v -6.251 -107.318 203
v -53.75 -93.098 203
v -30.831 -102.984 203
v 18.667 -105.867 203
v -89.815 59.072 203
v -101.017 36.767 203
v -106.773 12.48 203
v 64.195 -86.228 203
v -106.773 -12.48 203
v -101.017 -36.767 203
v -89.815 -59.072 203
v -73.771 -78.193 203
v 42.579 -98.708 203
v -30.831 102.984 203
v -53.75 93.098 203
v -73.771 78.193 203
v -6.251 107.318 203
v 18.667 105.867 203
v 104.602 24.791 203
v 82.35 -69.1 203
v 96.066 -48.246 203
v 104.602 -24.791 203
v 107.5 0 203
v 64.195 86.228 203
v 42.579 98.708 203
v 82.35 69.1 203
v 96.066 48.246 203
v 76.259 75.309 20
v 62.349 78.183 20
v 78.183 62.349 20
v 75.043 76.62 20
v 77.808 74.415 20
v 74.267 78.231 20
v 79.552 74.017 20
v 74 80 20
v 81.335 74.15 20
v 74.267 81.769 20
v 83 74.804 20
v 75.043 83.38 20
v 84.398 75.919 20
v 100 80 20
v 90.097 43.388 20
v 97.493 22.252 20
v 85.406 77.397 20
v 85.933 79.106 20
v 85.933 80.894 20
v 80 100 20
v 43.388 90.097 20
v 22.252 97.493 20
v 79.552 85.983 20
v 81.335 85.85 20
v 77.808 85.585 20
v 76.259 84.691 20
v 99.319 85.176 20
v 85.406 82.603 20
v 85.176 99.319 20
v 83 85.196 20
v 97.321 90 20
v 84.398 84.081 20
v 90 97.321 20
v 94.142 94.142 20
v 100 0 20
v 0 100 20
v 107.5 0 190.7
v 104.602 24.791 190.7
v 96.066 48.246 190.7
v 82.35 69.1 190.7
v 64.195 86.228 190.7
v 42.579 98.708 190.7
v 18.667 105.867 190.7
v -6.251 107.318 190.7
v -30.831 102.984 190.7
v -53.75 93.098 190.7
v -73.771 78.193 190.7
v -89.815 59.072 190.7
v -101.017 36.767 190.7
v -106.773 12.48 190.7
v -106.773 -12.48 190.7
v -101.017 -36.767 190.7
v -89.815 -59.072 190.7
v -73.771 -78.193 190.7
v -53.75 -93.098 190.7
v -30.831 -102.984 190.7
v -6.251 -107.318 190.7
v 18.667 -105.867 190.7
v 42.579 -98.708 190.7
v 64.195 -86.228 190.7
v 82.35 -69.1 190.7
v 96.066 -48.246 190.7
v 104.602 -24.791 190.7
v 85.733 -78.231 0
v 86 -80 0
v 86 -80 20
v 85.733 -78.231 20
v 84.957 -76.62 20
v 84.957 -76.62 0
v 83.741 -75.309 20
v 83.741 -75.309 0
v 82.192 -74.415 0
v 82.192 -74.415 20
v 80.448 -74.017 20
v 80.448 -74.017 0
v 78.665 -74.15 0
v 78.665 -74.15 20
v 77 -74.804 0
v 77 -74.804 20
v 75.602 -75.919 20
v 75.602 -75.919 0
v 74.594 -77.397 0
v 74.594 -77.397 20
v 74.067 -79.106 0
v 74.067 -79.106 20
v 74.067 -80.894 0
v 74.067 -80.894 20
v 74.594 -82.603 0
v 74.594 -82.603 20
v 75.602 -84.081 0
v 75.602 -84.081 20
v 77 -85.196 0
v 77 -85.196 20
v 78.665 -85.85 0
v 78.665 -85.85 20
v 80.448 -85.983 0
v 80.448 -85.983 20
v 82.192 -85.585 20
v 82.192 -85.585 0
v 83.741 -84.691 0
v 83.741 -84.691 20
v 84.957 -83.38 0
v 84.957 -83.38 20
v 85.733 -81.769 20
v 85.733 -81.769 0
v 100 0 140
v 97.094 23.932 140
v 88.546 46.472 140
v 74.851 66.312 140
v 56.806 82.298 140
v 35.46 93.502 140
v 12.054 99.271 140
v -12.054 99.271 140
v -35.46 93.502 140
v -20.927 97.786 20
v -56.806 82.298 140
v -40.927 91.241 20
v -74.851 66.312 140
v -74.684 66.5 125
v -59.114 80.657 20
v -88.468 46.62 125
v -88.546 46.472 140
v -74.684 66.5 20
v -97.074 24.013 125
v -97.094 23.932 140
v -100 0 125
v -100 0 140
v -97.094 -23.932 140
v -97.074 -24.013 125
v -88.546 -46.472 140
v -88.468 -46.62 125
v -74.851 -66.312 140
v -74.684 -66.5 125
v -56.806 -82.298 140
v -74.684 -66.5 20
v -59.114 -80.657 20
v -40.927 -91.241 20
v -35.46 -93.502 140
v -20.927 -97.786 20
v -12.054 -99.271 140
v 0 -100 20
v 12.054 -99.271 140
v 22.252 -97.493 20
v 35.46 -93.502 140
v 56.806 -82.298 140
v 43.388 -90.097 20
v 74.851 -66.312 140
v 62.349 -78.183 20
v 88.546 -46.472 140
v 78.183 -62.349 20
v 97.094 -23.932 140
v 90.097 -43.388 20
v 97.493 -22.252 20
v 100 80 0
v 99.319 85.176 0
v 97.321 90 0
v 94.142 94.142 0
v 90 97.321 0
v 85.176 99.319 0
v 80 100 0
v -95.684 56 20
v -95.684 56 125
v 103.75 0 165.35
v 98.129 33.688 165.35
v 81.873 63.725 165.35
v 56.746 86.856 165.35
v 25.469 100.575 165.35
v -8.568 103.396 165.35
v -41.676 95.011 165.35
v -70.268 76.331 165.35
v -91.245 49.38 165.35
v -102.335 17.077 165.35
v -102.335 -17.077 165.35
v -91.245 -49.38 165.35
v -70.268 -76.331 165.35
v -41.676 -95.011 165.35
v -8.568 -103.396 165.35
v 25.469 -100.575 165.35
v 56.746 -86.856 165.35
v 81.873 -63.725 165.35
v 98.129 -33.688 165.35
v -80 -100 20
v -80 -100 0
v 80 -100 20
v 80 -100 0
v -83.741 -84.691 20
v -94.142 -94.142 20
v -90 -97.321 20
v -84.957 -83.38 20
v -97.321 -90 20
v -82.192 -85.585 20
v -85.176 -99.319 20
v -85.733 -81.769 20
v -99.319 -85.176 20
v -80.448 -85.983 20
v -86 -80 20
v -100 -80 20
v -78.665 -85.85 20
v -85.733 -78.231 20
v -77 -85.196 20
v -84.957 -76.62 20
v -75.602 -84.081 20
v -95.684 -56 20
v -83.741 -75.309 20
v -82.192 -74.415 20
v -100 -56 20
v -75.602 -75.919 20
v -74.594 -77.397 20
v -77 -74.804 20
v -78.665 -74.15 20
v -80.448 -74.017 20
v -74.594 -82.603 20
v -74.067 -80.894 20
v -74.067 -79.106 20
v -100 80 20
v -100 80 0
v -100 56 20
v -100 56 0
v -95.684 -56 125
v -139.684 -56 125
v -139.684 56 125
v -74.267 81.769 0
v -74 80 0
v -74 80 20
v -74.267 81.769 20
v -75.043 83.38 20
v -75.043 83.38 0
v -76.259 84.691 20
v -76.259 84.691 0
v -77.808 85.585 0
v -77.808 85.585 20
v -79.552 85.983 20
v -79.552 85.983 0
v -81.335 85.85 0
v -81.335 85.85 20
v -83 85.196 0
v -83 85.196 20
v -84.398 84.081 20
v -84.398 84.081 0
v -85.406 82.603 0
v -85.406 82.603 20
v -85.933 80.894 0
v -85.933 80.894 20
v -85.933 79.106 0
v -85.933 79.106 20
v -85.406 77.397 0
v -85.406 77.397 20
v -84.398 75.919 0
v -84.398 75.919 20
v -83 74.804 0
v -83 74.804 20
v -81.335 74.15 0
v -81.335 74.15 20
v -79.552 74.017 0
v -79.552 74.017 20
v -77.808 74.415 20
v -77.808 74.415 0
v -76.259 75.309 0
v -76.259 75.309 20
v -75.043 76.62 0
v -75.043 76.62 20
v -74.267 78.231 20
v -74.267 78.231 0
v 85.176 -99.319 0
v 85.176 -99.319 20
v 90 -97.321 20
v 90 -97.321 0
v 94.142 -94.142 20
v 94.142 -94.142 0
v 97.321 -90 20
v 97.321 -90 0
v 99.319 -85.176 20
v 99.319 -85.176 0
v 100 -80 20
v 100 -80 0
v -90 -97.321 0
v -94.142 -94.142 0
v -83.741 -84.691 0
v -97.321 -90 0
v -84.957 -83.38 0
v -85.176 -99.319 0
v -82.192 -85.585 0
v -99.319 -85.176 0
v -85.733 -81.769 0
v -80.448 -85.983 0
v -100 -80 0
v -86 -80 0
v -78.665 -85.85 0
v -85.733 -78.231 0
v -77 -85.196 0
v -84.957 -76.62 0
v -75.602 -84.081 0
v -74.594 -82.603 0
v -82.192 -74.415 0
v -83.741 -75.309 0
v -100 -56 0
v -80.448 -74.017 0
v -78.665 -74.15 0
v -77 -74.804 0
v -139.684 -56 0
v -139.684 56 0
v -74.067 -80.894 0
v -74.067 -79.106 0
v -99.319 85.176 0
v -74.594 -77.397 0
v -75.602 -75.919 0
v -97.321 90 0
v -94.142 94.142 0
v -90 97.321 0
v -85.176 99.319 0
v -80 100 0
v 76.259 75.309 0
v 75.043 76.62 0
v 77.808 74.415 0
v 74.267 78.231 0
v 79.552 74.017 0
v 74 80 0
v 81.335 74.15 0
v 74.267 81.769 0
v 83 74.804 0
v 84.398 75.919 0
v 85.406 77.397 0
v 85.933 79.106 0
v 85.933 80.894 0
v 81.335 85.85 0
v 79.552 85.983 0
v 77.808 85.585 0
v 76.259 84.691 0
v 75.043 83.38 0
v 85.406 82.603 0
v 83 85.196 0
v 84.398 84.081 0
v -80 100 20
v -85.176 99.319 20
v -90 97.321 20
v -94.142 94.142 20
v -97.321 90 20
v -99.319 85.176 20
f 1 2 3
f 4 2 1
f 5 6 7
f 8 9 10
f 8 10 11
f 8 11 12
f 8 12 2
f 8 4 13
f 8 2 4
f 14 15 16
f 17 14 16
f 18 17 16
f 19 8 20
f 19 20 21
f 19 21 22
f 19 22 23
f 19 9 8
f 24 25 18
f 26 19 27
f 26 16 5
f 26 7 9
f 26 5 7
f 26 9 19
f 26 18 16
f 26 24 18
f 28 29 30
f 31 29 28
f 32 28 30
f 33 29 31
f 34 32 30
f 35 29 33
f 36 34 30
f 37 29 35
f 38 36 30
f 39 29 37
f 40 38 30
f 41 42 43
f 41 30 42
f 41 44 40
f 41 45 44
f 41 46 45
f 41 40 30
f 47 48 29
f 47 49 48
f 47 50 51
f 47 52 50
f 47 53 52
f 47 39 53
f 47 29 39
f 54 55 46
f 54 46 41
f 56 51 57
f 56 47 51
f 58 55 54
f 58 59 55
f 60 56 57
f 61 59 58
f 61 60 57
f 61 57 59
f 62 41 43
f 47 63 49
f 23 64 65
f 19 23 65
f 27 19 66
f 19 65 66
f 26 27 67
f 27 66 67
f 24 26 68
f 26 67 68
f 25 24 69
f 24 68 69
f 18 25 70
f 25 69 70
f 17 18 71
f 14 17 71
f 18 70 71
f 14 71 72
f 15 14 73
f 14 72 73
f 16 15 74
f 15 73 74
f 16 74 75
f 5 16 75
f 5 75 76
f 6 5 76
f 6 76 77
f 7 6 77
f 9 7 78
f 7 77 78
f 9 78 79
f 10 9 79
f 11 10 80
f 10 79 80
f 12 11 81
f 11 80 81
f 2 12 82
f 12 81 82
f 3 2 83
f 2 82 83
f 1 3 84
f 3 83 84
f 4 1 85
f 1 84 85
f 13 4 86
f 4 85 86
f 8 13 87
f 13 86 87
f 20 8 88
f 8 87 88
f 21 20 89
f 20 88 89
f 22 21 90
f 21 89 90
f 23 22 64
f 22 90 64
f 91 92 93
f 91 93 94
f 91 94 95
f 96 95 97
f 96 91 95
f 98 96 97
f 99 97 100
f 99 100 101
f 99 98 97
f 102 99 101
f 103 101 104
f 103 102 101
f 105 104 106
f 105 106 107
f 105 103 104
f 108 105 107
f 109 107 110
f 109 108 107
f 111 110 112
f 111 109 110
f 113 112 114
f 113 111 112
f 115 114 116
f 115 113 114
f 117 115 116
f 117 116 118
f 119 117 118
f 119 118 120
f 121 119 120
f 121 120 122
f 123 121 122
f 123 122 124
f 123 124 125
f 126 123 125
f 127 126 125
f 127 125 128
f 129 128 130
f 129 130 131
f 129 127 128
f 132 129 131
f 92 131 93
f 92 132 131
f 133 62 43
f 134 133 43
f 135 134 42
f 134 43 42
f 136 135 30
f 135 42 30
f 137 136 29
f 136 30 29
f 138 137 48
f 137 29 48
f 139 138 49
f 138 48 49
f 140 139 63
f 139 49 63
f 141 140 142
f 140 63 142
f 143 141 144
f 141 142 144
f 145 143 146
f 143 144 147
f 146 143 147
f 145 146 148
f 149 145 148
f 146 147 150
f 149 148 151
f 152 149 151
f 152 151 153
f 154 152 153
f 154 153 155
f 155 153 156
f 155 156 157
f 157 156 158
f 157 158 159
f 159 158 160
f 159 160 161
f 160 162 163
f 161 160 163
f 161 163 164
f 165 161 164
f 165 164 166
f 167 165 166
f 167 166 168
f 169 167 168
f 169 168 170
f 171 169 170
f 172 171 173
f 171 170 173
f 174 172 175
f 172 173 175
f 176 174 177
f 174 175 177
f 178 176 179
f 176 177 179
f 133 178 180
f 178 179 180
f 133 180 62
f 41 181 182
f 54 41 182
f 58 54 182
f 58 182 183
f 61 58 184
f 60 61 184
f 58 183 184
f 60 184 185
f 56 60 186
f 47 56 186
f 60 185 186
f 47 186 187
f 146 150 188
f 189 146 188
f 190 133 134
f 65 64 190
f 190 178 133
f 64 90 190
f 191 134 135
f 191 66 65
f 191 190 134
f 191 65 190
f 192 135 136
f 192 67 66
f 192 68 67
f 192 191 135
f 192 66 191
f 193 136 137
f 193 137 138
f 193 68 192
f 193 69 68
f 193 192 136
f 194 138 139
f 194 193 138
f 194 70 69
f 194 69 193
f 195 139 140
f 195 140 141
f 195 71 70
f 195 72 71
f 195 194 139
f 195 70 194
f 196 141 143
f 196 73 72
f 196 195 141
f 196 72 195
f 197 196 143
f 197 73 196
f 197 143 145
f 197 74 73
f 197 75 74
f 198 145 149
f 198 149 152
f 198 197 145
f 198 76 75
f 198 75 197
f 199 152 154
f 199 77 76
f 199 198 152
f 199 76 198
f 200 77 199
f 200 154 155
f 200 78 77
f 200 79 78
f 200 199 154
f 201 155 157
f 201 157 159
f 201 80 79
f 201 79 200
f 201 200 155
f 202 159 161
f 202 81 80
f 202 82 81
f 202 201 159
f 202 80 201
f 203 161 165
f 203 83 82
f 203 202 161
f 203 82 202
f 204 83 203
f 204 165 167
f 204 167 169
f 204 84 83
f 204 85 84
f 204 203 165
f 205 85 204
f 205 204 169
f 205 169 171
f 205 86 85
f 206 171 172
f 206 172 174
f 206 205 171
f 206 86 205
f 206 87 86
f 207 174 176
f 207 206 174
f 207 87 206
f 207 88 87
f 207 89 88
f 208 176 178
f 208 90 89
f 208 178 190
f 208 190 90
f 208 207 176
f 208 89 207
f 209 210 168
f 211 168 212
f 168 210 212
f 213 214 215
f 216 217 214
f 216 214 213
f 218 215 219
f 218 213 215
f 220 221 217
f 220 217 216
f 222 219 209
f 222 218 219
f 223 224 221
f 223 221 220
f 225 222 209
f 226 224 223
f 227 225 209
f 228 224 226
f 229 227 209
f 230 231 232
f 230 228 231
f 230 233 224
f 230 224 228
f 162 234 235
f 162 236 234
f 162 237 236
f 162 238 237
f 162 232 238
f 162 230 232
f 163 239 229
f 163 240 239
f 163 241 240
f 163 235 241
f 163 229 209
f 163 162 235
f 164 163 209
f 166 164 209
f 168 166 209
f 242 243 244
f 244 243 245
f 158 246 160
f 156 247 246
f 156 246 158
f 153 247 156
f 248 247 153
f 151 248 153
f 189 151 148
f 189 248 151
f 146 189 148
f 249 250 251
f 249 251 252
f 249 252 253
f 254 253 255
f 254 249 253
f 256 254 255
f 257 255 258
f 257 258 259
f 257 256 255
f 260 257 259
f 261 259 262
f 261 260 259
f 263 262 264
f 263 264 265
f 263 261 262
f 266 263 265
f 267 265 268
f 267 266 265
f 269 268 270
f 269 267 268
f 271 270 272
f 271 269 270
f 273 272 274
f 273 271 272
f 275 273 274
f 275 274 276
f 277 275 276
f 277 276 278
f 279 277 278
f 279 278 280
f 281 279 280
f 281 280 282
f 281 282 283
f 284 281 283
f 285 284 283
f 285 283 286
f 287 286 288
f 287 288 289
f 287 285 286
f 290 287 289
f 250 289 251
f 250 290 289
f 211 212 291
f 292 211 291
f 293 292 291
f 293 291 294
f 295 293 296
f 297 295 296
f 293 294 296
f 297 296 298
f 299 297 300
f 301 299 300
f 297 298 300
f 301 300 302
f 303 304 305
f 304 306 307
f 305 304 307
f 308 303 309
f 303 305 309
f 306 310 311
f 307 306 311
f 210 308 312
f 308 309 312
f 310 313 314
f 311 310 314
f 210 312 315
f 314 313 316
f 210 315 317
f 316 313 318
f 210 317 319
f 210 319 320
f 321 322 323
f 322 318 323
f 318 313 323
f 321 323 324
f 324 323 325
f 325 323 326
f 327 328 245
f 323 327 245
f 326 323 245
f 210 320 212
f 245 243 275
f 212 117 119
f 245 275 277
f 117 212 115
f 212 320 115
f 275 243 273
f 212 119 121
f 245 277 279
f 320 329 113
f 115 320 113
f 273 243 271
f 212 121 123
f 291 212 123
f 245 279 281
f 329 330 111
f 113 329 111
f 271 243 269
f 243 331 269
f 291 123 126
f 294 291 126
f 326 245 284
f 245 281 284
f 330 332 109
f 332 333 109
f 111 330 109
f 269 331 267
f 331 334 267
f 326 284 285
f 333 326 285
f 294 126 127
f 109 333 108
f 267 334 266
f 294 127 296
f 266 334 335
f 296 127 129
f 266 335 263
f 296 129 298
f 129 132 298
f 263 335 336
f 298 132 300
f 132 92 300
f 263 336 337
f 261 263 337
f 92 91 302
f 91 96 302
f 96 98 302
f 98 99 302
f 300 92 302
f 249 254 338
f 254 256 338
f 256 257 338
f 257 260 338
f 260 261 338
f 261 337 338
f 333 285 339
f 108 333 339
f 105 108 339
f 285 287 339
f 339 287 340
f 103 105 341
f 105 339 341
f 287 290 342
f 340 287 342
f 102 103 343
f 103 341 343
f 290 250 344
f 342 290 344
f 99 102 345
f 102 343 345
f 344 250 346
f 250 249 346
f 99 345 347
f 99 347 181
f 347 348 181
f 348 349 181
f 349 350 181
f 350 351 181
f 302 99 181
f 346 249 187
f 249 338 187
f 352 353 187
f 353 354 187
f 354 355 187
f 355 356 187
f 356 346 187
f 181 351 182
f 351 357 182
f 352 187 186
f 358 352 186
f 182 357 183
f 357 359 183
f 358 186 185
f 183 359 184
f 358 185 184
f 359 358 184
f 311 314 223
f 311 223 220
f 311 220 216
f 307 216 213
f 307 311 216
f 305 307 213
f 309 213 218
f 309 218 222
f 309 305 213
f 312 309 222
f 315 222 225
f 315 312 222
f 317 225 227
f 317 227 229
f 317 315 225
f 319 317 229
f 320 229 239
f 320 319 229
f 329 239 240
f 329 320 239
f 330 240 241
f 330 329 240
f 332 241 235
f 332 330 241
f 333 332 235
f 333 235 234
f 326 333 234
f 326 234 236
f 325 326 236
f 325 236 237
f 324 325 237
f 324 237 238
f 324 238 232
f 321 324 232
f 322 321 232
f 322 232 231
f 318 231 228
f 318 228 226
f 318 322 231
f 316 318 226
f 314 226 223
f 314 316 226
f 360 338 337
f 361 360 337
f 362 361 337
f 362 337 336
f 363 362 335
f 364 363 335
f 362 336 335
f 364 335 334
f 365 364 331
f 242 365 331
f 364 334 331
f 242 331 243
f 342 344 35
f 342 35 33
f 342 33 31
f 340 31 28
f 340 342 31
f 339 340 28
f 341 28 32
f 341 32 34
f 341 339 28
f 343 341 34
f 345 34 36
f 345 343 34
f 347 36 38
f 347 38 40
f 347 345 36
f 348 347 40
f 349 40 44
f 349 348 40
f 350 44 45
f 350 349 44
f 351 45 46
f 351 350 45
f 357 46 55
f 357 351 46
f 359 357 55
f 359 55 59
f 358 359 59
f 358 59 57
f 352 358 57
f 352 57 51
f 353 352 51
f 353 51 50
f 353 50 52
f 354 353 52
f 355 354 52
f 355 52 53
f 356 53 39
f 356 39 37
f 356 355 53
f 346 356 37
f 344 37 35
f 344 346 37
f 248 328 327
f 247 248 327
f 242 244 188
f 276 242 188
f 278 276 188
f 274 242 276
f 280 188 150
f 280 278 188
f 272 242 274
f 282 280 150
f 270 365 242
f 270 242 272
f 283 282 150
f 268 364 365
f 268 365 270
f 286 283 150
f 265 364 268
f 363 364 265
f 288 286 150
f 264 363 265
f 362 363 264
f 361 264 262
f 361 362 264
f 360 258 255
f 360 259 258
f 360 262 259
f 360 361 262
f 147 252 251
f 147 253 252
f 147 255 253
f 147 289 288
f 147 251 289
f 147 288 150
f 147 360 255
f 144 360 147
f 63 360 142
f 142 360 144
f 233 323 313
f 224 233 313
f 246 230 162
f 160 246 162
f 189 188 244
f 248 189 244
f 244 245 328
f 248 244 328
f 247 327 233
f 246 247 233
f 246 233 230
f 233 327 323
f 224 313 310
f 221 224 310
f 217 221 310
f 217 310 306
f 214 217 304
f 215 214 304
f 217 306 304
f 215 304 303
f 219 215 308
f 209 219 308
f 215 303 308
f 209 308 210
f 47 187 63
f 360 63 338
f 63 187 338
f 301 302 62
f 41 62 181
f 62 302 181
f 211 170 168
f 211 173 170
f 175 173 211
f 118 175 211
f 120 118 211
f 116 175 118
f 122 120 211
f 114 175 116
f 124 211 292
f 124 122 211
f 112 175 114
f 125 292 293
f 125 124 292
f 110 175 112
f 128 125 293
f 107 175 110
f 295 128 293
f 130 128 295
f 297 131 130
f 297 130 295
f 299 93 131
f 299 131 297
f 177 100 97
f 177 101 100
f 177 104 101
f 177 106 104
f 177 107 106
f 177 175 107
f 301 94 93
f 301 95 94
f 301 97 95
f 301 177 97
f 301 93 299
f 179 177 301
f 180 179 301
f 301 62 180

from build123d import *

# Parameters (mm, degrees)
SCHIZZO1_R                  = 6
PIASTRABASE_DEPTH           = 20
SCHIZZO2_R                  = 100
CORPOCILINDRICO_DEPTH       = 120
SCHIZZO3_R                  = 107.5
SCHIZZO4_R                  = 107.5
CORPOCILINDRICOFINALE_DEPTH = 12.3
PANNELLOCOMANDI_DEPTH       = 125


with BuildPart() as part:
    # Schizzo1 → PiastraBase (new body)
    with BuildSketch(Plane.XY):
        with BuildLine():
            Line((-80, -100), (80, -100))
            ThreePointArc((80, -100), (94.142135624, -94.142135624), (100, -80))
            Line((100, -80), (100, 80))
            ThreePointArc((100, 80), (94.142135624, 94.142135624), (80, 100))
            Line((80, 100), (-80, 100))
            ThreePointArc((-80, 100), (-94.142135624, 94.142135624), (-100, 80))
            Line((-100, 80), (-100, -80))
            ThreePointArc((-100, -80), (-94.142135624, -94.142135624), (-80, -100))
        make_face()
        with Locations((-80, 80)):
            Circle(SCHIZZO1_R, mode=Mode.SUBTRACT)
        with Locations(Location((-80, -80, 0), (0, 0, 180))):
            Circle(SCHIZZO1_R, mode=Mode.SUBTRACT)
        with Locations((80, -80)):
            Circle(SCHIZZO1_R, mode=Mode.SUBTRACT)
        with Locations(Location((80, 80, 0), (0, 0, 180))):
            Circle(SCHIZZO1_R, mode=Mode.SUBTRACT)
    extrude(amount=PIASTRABASE_DEPTH)

    # Schizzo2 → CorpoCilindrico (add)
    with BuildSketch(Plane.XY.offset(20)):
        Circle(SCHIZZO2_R)
    extrude(amount=CORPOCILINDRICO_DEPTH)

    # Schizzo3 → section 1 of loftcentrale
    with BuildSketch(Plane.XY.offset(190.7), mode=Mode.PRIVATE) as loftcentrale_s1:
        Circle(SCHIZZO3_R)
    # loft up to a face of the part (loftcentrale)
    loft([Face(Wire([part.edges().sort_by_distance((-68.454710593, 72.896862742, 140))[0]])), loftcentrale_s1.sketch])

    # Schizzo4 → CorpoCilindricoFinale (add)
    with BuildSketch(Plane.XY.offset(190.7)):
        Circle(SCHIZZO4_R)
    extrude(amount=CORPOCILINDRICOFINALE_DEPTH)

    # Schizzo5 → PannelloComandi (add)
    with BuildSketch(Plane.XY):
        with BuildLine():
            Line((-95.684335707, 56), (-139.684335707, 56))
            Line((-139.684335707, 56), (-139.684335707, -56))
            Line((-139.684335707, -56), (-95.684335707, -56))
            Line((-95.684335707, -56), (-74.684335707, -66.5))
            ThreePointArc((-74.684335707, -66.5), (-93.45703176, -35.577847246), (-100, 0))
            ThreePointArc((-100, 0), (-93.45703176, 35.577847246), (-74.684335707, 66.5))
            Line((-74.684335707, 66.5), (-95.684335707, 56))
        make_face()
    extrude(amount=PANNELLOCOMANDI_DEPTH)


solid = part.part
